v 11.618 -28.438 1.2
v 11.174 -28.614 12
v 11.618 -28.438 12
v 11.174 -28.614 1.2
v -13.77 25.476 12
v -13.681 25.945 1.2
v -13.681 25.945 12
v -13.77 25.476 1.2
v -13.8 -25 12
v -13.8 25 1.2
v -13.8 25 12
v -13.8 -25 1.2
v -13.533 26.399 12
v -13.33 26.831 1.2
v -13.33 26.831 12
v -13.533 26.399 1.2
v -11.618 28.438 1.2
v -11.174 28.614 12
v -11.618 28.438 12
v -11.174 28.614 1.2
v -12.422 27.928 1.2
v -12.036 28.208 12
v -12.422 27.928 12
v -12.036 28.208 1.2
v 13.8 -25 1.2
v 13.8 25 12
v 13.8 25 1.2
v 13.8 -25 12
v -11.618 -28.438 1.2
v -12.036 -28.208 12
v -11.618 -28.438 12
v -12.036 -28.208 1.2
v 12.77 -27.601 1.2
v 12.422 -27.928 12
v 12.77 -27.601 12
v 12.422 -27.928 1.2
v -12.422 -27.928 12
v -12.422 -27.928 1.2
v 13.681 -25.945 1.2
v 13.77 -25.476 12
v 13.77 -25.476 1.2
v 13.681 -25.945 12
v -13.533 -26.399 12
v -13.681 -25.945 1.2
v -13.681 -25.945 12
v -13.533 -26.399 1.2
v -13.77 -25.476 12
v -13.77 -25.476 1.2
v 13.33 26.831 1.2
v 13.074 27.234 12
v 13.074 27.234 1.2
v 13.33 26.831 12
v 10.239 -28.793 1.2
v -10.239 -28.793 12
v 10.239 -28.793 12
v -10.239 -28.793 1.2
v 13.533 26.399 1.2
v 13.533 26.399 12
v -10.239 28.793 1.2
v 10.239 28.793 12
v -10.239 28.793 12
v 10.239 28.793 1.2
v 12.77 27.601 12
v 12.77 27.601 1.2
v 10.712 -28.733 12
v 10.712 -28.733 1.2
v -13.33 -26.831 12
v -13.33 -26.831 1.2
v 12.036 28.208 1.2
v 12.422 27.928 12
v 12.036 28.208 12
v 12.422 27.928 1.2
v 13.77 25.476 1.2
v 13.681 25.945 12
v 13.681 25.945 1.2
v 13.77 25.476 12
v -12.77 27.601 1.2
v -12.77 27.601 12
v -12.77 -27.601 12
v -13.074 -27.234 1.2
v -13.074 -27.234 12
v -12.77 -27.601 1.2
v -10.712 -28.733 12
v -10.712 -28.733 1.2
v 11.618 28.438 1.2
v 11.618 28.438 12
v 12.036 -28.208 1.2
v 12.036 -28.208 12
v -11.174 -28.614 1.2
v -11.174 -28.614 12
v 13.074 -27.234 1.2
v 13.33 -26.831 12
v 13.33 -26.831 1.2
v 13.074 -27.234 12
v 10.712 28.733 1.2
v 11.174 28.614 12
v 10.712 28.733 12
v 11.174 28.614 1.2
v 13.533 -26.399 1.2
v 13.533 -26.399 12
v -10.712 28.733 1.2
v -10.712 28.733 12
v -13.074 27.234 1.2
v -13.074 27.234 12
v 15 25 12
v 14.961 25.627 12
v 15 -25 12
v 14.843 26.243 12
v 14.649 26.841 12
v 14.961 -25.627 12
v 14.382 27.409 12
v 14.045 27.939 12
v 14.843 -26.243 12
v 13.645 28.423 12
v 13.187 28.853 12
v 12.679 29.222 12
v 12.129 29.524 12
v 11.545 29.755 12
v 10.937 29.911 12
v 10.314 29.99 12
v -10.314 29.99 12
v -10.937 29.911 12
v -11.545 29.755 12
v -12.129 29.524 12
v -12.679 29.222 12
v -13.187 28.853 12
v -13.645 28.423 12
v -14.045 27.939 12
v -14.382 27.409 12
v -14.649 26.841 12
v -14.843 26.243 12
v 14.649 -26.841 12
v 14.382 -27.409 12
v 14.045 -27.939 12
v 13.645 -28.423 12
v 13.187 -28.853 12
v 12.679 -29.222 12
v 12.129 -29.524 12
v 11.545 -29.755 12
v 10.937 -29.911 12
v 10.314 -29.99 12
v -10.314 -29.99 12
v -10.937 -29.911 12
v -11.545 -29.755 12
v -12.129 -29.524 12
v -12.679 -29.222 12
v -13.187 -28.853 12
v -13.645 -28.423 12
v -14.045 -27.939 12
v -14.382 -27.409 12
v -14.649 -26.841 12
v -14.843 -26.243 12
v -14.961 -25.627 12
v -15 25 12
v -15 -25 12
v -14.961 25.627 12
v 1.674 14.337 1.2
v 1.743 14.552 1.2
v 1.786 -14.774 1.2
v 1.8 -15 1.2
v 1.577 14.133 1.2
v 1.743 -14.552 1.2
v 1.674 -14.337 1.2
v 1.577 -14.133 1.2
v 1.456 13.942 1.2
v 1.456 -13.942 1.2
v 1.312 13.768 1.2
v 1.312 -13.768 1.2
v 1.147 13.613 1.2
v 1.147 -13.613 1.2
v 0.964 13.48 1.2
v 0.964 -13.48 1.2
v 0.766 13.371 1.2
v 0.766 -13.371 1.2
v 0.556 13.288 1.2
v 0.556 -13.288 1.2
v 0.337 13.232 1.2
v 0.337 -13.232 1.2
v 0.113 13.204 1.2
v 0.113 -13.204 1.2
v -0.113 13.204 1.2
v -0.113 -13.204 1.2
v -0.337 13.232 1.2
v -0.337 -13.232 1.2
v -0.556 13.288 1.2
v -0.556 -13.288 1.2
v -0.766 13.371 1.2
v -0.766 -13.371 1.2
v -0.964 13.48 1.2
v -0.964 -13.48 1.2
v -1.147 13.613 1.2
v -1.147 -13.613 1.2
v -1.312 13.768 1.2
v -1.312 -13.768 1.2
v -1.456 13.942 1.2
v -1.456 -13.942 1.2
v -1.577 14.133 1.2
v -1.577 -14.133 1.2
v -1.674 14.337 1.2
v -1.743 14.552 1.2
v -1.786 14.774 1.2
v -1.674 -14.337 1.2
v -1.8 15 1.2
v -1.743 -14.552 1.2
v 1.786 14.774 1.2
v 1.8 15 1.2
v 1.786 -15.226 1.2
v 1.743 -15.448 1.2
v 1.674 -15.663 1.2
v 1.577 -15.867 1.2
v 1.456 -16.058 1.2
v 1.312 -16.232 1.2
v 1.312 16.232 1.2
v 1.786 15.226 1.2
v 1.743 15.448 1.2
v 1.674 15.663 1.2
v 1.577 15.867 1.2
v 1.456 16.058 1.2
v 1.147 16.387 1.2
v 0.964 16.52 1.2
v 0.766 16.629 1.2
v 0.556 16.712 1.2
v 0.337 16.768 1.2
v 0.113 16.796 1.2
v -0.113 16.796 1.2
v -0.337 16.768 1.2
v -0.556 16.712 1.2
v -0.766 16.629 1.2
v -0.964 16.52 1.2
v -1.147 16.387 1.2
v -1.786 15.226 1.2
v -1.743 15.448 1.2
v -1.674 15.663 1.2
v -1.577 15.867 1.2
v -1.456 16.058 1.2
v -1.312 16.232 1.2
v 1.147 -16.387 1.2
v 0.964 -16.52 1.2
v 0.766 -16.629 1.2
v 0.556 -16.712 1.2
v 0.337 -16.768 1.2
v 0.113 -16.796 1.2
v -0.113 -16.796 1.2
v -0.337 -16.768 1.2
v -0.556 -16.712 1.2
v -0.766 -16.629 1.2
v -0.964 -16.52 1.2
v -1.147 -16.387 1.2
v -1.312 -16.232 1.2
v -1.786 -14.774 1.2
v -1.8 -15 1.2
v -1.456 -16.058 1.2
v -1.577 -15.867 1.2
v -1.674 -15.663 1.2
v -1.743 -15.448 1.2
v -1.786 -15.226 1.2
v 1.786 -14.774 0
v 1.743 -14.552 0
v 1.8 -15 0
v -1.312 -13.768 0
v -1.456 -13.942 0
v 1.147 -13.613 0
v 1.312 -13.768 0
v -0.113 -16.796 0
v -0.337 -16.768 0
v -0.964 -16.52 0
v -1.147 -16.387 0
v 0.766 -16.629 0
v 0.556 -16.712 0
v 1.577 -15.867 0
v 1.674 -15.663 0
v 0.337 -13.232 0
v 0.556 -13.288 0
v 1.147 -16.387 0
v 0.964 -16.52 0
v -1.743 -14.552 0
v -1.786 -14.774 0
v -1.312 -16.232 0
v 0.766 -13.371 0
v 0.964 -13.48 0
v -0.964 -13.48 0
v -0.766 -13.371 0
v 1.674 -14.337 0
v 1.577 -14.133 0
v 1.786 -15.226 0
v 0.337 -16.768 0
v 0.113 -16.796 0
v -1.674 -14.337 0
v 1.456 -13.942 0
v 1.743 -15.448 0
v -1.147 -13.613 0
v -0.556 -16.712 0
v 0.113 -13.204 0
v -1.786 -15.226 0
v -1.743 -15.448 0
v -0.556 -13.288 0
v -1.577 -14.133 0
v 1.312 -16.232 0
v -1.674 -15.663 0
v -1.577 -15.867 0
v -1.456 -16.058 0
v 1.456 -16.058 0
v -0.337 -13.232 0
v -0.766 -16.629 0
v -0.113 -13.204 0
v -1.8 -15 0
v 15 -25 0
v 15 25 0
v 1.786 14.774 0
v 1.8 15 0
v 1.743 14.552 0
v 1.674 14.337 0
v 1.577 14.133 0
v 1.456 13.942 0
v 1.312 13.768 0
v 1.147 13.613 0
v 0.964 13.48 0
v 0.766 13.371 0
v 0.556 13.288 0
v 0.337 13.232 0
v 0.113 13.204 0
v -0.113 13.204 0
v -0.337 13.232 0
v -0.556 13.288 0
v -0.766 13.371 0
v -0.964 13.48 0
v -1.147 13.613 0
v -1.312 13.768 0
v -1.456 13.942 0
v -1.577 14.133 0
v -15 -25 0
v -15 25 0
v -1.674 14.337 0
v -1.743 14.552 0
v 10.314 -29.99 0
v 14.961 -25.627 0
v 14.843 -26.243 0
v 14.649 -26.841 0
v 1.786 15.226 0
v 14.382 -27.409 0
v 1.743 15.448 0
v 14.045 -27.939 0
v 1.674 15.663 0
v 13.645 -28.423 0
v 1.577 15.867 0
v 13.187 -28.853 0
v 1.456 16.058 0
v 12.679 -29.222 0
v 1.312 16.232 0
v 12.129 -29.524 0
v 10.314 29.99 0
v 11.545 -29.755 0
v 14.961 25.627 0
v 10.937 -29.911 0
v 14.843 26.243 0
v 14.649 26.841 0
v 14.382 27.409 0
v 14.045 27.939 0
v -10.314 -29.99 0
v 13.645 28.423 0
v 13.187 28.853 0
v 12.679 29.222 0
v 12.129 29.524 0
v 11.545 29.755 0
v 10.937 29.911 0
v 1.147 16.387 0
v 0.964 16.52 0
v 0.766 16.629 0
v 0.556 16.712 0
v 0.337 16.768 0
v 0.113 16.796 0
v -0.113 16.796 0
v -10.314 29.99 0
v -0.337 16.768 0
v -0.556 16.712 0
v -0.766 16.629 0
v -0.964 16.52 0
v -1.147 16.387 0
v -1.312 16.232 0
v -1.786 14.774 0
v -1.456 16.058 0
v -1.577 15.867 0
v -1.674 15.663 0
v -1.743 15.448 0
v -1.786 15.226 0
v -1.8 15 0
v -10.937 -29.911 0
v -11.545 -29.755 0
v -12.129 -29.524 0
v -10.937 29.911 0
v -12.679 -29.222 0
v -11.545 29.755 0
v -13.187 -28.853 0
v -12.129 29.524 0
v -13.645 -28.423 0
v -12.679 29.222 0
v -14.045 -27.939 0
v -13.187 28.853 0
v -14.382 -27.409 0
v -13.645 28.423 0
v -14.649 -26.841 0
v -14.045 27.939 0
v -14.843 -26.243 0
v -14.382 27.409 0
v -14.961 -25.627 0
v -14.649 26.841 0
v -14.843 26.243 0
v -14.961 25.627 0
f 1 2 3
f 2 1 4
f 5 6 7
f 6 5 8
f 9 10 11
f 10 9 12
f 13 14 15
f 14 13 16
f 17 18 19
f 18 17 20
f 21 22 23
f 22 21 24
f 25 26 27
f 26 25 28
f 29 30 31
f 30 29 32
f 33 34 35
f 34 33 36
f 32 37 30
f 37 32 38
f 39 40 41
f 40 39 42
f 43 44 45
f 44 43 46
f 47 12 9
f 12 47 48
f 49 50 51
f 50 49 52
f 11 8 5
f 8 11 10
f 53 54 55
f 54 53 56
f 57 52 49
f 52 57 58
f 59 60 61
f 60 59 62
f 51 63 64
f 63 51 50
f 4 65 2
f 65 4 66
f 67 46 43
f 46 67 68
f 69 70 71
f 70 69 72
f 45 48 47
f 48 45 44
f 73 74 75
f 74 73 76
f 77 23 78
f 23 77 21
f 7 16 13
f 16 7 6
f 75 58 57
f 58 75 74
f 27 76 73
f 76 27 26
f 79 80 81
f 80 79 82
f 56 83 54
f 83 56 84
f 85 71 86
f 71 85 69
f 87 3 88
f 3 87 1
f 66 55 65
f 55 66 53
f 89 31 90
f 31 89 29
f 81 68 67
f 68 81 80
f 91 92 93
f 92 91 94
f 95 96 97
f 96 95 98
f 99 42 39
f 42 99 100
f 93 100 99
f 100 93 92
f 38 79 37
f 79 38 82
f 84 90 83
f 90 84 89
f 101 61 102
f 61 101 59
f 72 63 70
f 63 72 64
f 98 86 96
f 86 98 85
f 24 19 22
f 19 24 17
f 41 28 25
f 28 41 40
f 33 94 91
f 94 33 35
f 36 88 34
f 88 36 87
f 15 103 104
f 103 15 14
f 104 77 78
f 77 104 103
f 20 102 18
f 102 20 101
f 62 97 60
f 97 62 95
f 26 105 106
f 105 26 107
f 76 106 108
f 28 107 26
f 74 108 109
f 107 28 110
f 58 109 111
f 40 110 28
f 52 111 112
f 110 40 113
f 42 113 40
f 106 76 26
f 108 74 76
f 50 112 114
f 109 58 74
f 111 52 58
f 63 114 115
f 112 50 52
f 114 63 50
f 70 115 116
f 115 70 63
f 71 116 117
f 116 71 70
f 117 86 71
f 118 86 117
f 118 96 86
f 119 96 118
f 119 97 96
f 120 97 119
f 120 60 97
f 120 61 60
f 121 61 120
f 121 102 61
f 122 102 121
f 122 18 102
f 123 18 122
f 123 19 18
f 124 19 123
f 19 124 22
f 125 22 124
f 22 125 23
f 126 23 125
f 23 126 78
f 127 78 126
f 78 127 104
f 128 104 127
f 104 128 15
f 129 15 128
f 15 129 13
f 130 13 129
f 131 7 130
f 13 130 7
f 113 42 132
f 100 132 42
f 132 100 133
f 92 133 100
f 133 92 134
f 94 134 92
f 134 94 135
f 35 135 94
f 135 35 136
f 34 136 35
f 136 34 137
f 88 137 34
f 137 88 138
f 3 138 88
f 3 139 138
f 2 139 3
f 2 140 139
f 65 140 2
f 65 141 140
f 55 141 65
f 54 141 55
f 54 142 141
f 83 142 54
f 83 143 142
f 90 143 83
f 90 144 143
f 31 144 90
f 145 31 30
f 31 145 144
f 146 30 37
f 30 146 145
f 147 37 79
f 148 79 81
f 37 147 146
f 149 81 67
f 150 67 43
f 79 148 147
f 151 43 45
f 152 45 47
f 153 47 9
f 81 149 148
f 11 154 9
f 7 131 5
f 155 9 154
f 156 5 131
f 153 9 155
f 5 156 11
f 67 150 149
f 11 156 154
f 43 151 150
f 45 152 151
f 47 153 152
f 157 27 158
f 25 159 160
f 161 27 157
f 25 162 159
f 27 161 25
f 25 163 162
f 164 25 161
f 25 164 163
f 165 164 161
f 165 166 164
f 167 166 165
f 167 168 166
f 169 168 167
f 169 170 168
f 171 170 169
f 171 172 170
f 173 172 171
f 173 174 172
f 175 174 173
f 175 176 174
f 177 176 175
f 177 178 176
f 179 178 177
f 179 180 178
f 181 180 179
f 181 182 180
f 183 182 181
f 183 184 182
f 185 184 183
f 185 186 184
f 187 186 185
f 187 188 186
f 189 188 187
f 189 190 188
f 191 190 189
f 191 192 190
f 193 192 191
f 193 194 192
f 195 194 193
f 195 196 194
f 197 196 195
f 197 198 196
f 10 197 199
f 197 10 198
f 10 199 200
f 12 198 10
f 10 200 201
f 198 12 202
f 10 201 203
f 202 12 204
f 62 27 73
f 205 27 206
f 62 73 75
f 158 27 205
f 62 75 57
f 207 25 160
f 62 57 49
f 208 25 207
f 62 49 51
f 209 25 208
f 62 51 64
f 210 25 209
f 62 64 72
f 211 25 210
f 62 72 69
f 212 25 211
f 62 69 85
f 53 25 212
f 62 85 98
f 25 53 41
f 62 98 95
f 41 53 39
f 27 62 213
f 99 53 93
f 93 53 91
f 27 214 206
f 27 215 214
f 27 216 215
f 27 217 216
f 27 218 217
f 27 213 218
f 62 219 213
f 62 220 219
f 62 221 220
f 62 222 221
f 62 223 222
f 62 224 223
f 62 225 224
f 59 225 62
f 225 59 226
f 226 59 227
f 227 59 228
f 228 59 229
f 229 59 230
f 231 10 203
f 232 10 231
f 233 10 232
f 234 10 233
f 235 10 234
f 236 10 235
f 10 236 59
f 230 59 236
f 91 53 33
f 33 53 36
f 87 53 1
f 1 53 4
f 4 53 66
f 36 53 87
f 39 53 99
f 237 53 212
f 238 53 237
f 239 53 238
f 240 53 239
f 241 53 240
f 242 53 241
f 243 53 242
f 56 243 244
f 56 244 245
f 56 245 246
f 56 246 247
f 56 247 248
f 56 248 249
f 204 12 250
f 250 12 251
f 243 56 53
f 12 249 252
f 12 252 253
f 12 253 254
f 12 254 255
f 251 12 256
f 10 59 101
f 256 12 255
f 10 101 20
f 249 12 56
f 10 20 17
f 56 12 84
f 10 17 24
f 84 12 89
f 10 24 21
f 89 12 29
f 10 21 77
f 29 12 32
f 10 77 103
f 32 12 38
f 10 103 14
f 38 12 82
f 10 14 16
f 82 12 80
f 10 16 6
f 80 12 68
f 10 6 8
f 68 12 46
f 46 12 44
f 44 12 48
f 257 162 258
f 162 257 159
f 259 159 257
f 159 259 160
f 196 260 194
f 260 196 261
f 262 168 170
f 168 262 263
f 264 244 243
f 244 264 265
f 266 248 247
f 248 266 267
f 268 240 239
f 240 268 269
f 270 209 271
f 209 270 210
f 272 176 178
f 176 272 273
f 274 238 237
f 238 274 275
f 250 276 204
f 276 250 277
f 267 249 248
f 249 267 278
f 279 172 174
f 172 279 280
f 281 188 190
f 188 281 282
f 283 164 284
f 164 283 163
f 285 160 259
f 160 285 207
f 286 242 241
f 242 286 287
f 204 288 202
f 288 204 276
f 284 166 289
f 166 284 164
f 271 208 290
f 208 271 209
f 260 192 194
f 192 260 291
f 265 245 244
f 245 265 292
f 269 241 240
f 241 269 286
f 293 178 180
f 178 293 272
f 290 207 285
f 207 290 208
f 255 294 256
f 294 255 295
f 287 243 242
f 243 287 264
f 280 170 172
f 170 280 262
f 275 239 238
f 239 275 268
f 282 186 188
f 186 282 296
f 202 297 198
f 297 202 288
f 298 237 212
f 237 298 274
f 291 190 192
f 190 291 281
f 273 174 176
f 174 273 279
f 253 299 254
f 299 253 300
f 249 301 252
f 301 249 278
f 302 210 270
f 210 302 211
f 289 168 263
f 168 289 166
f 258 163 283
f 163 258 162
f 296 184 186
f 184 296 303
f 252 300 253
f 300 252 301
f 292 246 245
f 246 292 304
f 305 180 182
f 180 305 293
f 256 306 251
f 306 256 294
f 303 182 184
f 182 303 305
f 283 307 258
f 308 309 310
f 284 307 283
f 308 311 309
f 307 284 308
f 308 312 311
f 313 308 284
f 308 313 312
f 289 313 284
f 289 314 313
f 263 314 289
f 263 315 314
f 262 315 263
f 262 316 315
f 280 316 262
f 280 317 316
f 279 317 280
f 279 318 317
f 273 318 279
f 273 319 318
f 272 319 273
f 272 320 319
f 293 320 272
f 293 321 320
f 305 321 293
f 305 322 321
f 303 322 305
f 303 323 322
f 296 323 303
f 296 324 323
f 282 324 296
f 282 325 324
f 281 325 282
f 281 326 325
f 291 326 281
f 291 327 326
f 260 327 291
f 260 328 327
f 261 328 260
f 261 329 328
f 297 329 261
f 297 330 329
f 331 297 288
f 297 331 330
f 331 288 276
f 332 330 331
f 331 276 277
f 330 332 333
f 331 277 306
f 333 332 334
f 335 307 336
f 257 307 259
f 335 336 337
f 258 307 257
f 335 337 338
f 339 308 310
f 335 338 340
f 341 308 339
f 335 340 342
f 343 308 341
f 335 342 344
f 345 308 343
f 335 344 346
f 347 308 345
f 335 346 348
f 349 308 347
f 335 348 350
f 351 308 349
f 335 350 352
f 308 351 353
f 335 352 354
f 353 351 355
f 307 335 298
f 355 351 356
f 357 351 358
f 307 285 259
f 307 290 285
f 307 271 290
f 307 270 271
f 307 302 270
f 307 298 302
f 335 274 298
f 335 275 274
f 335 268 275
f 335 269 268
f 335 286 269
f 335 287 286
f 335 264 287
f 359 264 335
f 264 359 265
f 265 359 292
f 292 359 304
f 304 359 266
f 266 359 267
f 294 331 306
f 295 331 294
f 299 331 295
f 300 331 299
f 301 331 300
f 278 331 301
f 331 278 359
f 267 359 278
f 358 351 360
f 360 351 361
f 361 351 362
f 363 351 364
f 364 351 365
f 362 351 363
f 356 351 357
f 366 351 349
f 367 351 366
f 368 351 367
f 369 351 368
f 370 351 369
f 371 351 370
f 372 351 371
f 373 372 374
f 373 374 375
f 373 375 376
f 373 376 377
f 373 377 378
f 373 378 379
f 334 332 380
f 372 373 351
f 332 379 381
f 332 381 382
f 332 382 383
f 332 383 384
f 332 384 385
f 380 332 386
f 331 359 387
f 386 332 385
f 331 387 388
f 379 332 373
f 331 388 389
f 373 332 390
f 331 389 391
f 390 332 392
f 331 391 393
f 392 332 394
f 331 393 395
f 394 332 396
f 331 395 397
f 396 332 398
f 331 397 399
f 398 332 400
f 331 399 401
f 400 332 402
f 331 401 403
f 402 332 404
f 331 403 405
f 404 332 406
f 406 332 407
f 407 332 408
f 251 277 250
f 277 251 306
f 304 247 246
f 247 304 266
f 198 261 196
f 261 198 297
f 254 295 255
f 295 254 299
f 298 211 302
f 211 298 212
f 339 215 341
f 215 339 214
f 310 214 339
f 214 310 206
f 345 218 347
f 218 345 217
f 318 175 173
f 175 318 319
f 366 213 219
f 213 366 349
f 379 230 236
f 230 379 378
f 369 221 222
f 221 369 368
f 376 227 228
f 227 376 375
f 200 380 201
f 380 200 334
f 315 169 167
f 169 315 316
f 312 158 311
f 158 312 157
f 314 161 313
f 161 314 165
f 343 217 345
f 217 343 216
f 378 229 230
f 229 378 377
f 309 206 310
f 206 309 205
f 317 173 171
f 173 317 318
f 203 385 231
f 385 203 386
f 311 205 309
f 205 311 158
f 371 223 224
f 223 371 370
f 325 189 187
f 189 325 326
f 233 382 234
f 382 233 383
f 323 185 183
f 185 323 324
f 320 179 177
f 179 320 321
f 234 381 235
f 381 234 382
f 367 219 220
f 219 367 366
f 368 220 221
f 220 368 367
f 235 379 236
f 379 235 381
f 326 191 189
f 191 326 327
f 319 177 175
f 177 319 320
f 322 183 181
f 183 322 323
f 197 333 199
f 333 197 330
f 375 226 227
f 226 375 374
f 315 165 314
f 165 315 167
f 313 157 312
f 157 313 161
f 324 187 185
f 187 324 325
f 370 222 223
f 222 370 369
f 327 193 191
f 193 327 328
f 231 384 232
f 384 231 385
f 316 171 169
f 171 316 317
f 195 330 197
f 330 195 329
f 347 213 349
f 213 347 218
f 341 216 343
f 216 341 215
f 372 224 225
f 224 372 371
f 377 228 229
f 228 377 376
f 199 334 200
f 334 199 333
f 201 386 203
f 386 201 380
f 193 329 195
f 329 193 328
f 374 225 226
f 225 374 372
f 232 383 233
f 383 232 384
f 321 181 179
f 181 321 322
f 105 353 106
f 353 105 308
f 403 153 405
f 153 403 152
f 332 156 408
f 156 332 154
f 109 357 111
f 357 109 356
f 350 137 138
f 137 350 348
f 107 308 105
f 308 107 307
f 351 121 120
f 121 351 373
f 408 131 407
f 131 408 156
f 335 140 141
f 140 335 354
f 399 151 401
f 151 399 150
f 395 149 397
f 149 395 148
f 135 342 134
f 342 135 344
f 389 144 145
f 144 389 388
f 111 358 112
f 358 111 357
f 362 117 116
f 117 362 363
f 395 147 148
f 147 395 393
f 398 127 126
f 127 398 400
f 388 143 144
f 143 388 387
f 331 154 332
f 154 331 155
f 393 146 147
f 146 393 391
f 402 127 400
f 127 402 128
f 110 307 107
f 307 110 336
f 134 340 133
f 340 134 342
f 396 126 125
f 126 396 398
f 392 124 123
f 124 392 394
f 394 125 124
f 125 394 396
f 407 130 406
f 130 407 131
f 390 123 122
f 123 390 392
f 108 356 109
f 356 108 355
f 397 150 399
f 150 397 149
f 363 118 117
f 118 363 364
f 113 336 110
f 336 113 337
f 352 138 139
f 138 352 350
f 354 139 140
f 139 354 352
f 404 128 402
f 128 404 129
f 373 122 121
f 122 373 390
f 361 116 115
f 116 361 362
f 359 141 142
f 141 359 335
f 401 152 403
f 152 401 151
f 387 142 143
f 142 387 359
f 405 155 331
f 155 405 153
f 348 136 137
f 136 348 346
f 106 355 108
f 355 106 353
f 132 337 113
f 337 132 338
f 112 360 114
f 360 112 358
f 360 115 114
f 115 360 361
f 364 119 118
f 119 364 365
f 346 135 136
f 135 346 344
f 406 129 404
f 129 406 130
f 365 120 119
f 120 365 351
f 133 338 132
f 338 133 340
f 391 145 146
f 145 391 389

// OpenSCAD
$fn = 50;


difference() {
	union() {
		hull() {
			translate(v = [-10.0000000000, 25.0000000000, 0]) {
				cylinder(h = 12, r = 5);
			}
			translate(v = [10.0000000000, 25.0000000000, 0]) {
				cylinder(h = 12, r = 5);
			}
			translate(v = [-10.0000000000, -25.0000000000, 0]) {
				cylinder(h = 12, r = 5);
			}
			translate(v = [10.0000000000, -25.0000000000, 0]) {
				cylinder(h = 12, r = 5);
			}
		}
	}
	union() {
		translate(v = [0, 0, 1.2000000000]) {
			hull() {
				translate(v = [-10.0000000000, 25.0000000000, 0]) {
					cylinder(h = 10.8000000000, r = 3.8000000000);
				}
				translate(v = [10.0000000000, 25.0000000000, 0]) {
					cylinder(h = 10.8000000000, r = 3.8000000000);
				}
				translate(v = [-10.0000000000, -25.0000000000, 0]) {
					cylinder(h = 10.8000000000, r = 3.8000000000);
				}
				translate(v = [10.0000000000, -25.0000000000, 0]) {
					cylinder(h = 10.8000000000, r = 3.8000000000);
				}
			}
		}
		#translate(v = [0.0000000000, -15.0000000000, 0]) {
			cylinder(h = 1.2000000000, r = 1.8000000000);
		}
		#translate(v = [0.0000000000, 15.0000000000, 0]) {
			cylinder(h = 1.2000000000, r = 1.8000000000);
		}
	}
}
